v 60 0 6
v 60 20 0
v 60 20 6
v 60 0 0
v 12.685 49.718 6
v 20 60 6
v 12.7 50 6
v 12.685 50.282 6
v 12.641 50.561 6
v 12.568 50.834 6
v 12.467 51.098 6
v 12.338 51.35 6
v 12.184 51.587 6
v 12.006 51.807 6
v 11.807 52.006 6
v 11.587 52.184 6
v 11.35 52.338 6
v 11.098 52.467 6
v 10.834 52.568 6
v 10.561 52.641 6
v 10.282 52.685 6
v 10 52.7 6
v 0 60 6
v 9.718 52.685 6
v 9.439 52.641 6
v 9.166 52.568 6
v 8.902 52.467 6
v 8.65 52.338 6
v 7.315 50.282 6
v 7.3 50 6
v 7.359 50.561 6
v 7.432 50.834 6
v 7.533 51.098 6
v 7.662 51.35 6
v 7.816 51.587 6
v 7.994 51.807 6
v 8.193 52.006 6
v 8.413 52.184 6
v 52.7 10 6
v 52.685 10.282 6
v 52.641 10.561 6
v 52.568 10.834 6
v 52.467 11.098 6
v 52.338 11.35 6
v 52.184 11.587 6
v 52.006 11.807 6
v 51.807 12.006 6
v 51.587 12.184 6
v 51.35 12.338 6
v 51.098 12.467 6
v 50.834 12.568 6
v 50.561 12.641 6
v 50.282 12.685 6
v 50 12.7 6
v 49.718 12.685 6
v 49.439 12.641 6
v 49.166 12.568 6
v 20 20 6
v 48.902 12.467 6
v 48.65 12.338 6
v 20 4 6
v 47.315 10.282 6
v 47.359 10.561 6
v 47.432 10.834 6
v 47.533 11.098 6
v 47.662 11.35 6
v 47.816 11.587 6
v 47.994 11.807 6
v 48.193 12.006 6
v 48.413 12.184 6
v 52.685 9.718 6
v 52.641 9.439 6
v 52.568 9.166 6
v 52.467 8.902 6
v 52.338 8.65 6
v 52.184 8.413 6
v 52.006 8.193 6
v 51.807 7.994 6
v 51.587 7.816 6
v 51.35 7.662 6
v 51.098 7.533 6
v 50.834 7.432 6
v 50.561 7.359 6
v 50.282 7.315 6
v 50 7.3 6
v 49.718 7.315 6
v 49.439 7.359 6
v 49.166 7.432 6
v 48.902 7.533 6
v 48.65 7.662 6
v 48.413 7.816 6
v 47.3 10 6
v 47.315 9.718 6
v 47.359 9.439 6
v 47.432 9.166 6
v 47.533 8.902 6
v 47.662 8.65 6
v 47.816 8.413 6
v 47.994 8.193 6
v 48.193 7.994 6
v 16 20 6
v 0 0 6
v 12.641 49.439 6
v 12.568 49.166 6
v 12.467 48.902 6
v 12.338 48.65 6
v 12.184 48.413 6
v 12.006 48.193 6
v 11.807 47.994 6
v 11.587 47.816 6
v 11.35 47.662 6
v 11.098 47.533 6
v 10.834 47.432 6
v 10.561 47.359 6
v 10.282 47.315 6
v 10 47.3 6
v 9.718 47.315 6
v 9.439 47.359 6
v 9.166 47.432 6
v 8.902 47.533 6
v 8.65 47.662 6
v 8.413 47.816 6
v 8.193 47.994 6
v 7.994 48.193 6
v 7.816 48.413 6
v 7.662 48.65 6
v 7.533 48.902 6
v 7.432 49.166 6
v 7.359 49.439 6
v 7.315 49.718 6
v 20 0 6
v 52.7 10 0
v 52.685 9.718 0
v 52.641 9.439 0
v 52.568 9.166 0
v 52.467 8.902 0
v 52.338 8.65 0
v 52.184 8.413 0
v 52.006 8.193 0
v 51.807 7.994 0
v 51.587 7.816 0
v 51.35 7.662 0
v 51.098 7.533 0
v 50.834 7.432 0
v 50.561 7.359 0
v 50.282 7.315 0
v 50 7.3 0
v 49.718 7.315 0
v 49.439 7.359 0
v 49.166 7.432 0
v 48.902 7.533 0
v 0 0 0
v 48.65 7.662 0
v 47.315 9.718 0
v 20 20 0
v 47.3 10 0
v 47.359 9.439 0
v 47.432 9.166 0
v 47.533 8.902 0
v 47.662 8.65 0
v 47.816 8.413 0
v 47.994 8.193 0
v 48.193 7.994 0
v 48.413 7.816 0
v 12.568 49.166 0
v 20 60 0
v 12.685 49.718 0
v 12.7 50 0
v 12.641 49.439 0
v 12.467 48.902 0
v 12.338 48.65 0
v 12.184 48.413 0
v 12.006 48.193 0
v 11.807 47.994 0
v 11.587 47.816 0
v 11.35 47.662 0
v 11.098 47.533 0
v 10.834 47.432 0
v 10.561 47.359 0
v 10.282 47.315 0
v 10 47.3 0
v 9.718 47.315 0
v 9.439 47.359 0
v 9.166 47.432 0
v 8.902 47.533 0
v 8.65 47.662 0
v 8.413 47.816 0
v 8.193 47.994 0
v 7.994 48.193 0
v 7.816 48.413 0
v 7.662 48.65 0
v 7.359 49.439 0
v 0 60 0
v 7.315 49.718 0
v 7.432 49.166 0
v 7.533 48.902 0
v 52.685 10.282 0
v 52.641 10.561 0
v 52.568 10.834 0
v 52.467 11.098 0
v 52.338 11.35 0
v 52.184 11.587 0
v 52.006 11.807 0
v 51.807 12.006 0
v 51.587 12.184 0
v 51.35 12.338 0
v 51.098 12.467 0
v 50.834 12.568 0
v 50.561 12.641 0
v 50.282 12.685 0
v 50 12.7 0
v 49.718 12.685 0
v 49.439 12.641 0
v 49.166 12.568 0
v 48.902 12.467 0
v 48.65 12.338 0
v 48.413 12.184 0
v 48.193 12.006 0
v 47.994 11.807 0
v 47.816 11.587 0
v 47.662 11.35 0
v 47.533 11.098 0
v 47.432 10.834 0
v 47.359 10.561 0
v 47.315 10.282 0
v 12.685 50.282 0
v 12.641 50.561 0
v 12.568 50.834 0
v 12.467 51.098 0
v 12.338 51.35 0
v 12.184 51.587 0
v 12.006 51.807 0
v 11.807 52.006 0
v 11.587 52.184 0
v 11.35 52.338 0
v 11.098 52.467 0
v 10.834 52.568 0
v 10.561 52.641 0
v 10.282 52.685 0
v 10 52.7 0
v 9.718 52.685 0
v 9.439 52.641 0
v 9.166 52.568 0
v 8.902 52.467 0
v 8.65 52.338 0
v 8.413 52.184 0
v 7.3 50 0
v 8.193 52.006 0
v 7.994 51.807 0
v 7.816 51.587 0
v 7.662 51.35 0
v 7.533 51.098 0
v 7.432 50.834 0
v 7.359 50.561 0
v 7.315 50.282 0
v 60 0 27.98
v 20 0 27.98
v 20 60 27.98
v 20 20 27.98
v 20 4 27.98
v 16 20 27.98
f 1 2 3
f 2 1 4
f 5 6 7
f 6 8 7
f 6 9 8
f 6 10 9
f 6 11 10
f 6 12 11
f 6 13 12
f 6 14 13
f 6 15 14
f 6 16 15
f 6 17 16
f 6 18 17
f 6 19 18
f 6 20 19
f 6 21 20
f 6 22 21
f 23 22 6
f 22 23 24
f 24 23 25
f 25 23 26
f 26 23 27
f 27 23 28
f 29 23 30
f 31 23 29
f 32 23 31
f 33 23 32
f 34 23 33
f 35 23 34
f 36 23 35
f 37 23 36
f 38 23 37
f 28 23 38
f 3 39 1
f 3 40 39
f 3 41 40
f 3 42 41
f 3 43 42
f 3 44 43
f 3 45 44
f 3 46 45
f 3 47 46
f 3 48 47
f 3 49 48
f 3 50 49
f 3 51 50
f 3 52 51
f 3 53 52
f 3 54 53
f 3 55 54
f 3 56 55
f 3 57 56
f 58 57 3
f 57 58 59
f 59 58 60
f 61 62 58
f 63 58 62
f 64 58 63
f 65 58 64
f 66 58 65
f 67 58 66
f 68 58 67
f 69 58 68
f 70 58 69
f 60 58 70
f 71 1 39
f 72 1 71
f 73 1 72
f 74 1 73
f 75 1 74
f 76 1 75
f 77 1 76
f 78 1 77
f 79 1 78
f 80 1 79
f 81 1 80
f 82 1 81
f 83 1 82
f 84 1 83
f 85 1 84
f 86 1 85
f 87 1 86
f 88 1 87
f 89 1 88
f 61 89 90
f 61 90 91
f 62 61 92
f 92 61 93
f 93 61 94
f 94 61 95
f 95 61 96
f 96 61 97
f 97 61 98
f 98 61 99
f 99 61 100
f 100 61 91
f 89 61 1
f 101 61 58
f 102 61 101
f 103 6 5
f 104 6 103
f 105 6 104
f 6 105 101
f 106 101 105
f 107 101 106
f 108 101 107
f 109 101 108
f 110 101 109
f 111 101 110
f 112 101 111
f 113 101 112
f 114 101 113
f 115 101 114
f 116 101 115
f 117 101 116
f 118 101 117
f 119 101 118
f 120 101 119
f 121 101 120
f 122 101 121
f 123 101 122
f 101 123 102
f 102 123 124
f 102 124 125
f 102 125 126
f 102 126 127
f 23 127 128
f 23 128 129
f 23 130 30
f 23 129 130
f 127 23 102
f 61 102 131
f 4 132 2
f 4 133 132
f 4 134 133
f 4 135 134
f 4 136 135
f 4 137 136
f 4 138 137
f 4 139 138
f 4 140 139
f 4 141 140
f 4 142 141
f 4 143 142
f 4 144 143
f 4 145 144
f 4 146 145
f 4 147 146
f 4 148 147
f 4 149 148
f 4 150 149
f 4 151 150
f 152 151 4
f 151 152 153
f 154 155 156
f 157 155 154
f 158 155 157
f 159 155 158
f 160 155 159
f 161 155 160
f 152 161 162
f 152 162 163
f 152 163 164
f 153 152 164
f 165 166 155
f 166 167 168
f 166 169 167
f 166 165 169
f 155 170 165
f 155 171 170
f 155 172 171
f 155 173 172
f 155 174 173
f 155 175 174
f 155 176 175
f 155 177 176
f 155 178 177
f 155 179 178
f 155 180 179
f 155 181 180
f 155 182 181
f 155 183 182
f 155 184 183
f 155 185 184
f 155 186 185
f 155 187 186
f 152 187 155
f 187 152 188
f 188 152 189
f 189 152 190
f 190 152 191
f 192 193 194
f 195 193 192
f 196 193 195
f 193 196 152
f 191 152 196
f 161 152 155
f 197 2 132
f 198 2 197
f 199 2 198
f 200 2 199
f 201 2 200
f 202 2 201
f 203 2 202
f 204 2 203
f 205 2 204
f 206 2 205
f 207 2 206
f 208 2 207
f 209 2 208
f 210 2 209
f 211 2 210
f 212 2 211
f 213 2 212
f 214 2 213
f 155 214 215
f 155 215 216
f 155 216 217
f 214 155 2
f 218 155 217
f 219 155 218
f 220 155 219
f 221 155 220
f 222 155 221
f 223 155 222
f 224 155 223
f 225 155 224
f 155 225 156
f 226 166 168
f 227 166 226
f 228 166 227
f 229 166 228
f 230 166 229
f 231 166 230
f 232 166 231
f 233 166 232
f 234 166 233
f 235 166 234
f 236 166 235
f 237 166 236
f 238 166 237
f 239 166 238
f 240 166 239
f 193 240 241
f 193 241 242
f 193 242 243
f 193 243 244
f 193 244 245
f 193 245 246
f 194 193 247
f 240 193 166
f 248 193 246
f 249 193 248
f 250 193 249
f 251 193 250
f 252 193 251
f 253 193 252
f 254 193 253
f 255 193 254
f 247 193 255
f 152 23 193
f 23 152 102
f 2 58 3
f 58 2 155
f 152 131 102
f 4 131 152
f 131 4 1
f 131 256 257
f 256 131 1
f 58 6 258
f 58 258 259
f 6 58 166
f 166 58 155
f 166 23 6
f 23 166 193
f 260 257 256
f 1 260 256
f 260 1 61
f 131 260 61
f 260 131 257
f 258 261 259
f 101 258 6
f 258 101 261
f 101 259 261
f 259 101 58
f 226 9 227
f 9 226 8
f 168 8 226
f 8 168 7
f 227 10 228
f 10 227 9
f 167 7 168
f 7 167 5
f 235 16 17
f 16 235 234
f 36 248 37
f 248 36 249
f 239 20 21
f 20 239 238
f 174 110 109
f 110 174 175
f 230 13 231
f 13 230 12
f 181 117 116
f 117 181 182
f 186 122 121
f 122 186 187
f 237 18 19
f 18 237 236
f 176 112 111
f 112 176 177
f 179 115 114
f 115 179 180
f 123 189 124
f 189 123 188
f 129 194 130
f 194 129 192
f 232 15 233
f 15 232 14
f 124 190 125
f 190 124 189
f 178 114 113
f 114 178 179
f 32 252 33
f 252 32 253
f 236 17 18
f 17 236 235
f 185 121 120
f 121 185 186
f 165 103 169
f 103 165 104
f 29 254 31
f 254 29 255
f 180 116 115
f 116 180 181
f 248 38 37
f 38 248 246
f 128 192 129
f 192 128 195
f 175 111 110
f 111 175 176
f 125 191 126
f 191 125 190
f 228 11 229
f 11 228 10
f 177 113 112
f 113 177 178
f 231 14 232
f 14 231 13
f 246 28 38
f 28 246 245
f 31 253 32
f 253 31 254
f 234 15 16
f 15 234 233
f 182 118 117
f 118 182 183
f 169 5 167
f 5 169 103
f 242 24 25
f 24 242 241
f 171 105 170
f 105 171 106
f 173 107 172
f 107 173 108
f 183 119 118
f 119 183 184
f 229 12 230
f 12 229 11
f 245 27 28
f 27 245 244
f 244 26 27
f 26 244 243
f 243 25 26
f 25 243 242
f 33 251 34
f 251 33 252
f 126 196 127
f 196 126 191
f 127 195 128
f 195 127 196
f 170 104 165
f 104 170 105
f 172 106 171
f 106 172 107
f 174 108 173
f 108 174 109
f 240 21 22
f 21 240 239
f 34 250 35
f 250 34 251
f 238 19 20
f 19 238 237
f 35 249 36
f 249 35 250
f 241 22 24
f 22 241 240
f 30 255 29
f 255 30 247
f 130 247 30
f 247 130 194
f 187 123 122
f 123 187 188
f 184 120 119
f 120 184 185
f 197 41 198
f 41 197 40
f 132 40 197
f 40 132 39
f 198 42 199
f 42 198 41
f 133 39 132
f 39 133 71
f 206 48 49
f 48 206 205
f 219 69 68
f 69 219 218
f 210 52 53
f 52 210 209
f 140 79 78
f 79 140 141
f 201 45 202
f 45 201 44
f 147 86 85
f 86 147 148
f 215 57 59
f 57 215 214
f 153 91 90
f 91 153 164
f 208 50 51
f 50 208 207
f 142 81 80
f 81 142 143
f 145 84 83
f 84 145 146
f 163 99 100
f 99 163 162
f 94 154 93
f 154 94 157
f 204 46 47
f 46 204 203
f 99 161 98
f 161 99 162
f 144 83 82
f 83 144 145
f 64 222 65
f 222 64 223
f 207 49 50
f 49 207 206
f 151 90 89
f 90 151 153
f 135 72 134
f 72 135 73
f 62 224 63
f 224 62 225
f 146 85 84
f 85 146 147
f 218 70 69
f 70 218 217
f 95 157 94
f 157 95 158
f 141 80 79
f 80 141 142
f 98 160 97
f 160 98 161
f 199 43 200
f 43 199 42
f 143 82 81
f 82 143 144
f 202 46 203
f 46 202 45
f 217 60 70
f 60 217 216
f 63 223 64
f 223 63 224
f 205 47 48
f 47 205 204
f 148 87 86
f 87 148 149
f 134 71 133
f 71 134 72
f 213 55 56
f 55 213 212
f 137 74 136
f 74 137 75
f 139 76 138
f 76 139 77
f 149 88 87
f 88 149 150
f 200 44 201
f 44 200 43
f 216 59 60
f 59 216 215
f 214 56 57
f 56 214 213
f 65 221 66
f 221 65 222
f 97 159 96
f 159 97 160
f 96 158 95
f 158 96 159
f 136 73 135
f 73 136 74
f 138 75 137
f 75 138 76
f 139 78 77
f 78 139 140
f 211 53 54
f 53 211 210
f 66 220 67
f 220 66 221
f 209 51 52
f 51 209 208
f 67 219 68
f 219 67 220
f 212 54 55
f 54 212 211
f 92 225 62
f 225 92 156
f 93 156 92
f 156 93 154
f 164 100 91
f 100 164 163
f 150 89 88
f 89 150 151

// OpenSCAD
// Reinforced right-angle gusset for 20 mm profile.
$fn = 60;
eps = 0.02;
profile = 20;
arm = 60;
plate_t = 6;
rib_t = 4;
rib_h = 22;
module rib_x() {
    translate([profile, 0, plate_t - eps]) linear_extrude(height = rib_h)
        polygon(points = [[0, 0], [arm - profile, 0], [0, rib_t]]);
}
module rib_y() {
    translate([profile, profile, plate_t - eps]) rotate([0, 0, 90]) linear_extrude(height = rib_h)
        polygon(points = [[0, 0], [arm - profile, 0], [0, rib_t]]);
}
difference() {
    union() { cube([arm, profile, plate_t]); cube([profile, arm, plate_t]); rib_x(); rib_y(); }
    for (p = [[profile / 2, arm - profile / 2], [arm - profile / 2, profile / 2]])
        translate([p[0], p[1], -eps]) cylinder(d = 5.4, h = plate_t + 2 * eps);
}
